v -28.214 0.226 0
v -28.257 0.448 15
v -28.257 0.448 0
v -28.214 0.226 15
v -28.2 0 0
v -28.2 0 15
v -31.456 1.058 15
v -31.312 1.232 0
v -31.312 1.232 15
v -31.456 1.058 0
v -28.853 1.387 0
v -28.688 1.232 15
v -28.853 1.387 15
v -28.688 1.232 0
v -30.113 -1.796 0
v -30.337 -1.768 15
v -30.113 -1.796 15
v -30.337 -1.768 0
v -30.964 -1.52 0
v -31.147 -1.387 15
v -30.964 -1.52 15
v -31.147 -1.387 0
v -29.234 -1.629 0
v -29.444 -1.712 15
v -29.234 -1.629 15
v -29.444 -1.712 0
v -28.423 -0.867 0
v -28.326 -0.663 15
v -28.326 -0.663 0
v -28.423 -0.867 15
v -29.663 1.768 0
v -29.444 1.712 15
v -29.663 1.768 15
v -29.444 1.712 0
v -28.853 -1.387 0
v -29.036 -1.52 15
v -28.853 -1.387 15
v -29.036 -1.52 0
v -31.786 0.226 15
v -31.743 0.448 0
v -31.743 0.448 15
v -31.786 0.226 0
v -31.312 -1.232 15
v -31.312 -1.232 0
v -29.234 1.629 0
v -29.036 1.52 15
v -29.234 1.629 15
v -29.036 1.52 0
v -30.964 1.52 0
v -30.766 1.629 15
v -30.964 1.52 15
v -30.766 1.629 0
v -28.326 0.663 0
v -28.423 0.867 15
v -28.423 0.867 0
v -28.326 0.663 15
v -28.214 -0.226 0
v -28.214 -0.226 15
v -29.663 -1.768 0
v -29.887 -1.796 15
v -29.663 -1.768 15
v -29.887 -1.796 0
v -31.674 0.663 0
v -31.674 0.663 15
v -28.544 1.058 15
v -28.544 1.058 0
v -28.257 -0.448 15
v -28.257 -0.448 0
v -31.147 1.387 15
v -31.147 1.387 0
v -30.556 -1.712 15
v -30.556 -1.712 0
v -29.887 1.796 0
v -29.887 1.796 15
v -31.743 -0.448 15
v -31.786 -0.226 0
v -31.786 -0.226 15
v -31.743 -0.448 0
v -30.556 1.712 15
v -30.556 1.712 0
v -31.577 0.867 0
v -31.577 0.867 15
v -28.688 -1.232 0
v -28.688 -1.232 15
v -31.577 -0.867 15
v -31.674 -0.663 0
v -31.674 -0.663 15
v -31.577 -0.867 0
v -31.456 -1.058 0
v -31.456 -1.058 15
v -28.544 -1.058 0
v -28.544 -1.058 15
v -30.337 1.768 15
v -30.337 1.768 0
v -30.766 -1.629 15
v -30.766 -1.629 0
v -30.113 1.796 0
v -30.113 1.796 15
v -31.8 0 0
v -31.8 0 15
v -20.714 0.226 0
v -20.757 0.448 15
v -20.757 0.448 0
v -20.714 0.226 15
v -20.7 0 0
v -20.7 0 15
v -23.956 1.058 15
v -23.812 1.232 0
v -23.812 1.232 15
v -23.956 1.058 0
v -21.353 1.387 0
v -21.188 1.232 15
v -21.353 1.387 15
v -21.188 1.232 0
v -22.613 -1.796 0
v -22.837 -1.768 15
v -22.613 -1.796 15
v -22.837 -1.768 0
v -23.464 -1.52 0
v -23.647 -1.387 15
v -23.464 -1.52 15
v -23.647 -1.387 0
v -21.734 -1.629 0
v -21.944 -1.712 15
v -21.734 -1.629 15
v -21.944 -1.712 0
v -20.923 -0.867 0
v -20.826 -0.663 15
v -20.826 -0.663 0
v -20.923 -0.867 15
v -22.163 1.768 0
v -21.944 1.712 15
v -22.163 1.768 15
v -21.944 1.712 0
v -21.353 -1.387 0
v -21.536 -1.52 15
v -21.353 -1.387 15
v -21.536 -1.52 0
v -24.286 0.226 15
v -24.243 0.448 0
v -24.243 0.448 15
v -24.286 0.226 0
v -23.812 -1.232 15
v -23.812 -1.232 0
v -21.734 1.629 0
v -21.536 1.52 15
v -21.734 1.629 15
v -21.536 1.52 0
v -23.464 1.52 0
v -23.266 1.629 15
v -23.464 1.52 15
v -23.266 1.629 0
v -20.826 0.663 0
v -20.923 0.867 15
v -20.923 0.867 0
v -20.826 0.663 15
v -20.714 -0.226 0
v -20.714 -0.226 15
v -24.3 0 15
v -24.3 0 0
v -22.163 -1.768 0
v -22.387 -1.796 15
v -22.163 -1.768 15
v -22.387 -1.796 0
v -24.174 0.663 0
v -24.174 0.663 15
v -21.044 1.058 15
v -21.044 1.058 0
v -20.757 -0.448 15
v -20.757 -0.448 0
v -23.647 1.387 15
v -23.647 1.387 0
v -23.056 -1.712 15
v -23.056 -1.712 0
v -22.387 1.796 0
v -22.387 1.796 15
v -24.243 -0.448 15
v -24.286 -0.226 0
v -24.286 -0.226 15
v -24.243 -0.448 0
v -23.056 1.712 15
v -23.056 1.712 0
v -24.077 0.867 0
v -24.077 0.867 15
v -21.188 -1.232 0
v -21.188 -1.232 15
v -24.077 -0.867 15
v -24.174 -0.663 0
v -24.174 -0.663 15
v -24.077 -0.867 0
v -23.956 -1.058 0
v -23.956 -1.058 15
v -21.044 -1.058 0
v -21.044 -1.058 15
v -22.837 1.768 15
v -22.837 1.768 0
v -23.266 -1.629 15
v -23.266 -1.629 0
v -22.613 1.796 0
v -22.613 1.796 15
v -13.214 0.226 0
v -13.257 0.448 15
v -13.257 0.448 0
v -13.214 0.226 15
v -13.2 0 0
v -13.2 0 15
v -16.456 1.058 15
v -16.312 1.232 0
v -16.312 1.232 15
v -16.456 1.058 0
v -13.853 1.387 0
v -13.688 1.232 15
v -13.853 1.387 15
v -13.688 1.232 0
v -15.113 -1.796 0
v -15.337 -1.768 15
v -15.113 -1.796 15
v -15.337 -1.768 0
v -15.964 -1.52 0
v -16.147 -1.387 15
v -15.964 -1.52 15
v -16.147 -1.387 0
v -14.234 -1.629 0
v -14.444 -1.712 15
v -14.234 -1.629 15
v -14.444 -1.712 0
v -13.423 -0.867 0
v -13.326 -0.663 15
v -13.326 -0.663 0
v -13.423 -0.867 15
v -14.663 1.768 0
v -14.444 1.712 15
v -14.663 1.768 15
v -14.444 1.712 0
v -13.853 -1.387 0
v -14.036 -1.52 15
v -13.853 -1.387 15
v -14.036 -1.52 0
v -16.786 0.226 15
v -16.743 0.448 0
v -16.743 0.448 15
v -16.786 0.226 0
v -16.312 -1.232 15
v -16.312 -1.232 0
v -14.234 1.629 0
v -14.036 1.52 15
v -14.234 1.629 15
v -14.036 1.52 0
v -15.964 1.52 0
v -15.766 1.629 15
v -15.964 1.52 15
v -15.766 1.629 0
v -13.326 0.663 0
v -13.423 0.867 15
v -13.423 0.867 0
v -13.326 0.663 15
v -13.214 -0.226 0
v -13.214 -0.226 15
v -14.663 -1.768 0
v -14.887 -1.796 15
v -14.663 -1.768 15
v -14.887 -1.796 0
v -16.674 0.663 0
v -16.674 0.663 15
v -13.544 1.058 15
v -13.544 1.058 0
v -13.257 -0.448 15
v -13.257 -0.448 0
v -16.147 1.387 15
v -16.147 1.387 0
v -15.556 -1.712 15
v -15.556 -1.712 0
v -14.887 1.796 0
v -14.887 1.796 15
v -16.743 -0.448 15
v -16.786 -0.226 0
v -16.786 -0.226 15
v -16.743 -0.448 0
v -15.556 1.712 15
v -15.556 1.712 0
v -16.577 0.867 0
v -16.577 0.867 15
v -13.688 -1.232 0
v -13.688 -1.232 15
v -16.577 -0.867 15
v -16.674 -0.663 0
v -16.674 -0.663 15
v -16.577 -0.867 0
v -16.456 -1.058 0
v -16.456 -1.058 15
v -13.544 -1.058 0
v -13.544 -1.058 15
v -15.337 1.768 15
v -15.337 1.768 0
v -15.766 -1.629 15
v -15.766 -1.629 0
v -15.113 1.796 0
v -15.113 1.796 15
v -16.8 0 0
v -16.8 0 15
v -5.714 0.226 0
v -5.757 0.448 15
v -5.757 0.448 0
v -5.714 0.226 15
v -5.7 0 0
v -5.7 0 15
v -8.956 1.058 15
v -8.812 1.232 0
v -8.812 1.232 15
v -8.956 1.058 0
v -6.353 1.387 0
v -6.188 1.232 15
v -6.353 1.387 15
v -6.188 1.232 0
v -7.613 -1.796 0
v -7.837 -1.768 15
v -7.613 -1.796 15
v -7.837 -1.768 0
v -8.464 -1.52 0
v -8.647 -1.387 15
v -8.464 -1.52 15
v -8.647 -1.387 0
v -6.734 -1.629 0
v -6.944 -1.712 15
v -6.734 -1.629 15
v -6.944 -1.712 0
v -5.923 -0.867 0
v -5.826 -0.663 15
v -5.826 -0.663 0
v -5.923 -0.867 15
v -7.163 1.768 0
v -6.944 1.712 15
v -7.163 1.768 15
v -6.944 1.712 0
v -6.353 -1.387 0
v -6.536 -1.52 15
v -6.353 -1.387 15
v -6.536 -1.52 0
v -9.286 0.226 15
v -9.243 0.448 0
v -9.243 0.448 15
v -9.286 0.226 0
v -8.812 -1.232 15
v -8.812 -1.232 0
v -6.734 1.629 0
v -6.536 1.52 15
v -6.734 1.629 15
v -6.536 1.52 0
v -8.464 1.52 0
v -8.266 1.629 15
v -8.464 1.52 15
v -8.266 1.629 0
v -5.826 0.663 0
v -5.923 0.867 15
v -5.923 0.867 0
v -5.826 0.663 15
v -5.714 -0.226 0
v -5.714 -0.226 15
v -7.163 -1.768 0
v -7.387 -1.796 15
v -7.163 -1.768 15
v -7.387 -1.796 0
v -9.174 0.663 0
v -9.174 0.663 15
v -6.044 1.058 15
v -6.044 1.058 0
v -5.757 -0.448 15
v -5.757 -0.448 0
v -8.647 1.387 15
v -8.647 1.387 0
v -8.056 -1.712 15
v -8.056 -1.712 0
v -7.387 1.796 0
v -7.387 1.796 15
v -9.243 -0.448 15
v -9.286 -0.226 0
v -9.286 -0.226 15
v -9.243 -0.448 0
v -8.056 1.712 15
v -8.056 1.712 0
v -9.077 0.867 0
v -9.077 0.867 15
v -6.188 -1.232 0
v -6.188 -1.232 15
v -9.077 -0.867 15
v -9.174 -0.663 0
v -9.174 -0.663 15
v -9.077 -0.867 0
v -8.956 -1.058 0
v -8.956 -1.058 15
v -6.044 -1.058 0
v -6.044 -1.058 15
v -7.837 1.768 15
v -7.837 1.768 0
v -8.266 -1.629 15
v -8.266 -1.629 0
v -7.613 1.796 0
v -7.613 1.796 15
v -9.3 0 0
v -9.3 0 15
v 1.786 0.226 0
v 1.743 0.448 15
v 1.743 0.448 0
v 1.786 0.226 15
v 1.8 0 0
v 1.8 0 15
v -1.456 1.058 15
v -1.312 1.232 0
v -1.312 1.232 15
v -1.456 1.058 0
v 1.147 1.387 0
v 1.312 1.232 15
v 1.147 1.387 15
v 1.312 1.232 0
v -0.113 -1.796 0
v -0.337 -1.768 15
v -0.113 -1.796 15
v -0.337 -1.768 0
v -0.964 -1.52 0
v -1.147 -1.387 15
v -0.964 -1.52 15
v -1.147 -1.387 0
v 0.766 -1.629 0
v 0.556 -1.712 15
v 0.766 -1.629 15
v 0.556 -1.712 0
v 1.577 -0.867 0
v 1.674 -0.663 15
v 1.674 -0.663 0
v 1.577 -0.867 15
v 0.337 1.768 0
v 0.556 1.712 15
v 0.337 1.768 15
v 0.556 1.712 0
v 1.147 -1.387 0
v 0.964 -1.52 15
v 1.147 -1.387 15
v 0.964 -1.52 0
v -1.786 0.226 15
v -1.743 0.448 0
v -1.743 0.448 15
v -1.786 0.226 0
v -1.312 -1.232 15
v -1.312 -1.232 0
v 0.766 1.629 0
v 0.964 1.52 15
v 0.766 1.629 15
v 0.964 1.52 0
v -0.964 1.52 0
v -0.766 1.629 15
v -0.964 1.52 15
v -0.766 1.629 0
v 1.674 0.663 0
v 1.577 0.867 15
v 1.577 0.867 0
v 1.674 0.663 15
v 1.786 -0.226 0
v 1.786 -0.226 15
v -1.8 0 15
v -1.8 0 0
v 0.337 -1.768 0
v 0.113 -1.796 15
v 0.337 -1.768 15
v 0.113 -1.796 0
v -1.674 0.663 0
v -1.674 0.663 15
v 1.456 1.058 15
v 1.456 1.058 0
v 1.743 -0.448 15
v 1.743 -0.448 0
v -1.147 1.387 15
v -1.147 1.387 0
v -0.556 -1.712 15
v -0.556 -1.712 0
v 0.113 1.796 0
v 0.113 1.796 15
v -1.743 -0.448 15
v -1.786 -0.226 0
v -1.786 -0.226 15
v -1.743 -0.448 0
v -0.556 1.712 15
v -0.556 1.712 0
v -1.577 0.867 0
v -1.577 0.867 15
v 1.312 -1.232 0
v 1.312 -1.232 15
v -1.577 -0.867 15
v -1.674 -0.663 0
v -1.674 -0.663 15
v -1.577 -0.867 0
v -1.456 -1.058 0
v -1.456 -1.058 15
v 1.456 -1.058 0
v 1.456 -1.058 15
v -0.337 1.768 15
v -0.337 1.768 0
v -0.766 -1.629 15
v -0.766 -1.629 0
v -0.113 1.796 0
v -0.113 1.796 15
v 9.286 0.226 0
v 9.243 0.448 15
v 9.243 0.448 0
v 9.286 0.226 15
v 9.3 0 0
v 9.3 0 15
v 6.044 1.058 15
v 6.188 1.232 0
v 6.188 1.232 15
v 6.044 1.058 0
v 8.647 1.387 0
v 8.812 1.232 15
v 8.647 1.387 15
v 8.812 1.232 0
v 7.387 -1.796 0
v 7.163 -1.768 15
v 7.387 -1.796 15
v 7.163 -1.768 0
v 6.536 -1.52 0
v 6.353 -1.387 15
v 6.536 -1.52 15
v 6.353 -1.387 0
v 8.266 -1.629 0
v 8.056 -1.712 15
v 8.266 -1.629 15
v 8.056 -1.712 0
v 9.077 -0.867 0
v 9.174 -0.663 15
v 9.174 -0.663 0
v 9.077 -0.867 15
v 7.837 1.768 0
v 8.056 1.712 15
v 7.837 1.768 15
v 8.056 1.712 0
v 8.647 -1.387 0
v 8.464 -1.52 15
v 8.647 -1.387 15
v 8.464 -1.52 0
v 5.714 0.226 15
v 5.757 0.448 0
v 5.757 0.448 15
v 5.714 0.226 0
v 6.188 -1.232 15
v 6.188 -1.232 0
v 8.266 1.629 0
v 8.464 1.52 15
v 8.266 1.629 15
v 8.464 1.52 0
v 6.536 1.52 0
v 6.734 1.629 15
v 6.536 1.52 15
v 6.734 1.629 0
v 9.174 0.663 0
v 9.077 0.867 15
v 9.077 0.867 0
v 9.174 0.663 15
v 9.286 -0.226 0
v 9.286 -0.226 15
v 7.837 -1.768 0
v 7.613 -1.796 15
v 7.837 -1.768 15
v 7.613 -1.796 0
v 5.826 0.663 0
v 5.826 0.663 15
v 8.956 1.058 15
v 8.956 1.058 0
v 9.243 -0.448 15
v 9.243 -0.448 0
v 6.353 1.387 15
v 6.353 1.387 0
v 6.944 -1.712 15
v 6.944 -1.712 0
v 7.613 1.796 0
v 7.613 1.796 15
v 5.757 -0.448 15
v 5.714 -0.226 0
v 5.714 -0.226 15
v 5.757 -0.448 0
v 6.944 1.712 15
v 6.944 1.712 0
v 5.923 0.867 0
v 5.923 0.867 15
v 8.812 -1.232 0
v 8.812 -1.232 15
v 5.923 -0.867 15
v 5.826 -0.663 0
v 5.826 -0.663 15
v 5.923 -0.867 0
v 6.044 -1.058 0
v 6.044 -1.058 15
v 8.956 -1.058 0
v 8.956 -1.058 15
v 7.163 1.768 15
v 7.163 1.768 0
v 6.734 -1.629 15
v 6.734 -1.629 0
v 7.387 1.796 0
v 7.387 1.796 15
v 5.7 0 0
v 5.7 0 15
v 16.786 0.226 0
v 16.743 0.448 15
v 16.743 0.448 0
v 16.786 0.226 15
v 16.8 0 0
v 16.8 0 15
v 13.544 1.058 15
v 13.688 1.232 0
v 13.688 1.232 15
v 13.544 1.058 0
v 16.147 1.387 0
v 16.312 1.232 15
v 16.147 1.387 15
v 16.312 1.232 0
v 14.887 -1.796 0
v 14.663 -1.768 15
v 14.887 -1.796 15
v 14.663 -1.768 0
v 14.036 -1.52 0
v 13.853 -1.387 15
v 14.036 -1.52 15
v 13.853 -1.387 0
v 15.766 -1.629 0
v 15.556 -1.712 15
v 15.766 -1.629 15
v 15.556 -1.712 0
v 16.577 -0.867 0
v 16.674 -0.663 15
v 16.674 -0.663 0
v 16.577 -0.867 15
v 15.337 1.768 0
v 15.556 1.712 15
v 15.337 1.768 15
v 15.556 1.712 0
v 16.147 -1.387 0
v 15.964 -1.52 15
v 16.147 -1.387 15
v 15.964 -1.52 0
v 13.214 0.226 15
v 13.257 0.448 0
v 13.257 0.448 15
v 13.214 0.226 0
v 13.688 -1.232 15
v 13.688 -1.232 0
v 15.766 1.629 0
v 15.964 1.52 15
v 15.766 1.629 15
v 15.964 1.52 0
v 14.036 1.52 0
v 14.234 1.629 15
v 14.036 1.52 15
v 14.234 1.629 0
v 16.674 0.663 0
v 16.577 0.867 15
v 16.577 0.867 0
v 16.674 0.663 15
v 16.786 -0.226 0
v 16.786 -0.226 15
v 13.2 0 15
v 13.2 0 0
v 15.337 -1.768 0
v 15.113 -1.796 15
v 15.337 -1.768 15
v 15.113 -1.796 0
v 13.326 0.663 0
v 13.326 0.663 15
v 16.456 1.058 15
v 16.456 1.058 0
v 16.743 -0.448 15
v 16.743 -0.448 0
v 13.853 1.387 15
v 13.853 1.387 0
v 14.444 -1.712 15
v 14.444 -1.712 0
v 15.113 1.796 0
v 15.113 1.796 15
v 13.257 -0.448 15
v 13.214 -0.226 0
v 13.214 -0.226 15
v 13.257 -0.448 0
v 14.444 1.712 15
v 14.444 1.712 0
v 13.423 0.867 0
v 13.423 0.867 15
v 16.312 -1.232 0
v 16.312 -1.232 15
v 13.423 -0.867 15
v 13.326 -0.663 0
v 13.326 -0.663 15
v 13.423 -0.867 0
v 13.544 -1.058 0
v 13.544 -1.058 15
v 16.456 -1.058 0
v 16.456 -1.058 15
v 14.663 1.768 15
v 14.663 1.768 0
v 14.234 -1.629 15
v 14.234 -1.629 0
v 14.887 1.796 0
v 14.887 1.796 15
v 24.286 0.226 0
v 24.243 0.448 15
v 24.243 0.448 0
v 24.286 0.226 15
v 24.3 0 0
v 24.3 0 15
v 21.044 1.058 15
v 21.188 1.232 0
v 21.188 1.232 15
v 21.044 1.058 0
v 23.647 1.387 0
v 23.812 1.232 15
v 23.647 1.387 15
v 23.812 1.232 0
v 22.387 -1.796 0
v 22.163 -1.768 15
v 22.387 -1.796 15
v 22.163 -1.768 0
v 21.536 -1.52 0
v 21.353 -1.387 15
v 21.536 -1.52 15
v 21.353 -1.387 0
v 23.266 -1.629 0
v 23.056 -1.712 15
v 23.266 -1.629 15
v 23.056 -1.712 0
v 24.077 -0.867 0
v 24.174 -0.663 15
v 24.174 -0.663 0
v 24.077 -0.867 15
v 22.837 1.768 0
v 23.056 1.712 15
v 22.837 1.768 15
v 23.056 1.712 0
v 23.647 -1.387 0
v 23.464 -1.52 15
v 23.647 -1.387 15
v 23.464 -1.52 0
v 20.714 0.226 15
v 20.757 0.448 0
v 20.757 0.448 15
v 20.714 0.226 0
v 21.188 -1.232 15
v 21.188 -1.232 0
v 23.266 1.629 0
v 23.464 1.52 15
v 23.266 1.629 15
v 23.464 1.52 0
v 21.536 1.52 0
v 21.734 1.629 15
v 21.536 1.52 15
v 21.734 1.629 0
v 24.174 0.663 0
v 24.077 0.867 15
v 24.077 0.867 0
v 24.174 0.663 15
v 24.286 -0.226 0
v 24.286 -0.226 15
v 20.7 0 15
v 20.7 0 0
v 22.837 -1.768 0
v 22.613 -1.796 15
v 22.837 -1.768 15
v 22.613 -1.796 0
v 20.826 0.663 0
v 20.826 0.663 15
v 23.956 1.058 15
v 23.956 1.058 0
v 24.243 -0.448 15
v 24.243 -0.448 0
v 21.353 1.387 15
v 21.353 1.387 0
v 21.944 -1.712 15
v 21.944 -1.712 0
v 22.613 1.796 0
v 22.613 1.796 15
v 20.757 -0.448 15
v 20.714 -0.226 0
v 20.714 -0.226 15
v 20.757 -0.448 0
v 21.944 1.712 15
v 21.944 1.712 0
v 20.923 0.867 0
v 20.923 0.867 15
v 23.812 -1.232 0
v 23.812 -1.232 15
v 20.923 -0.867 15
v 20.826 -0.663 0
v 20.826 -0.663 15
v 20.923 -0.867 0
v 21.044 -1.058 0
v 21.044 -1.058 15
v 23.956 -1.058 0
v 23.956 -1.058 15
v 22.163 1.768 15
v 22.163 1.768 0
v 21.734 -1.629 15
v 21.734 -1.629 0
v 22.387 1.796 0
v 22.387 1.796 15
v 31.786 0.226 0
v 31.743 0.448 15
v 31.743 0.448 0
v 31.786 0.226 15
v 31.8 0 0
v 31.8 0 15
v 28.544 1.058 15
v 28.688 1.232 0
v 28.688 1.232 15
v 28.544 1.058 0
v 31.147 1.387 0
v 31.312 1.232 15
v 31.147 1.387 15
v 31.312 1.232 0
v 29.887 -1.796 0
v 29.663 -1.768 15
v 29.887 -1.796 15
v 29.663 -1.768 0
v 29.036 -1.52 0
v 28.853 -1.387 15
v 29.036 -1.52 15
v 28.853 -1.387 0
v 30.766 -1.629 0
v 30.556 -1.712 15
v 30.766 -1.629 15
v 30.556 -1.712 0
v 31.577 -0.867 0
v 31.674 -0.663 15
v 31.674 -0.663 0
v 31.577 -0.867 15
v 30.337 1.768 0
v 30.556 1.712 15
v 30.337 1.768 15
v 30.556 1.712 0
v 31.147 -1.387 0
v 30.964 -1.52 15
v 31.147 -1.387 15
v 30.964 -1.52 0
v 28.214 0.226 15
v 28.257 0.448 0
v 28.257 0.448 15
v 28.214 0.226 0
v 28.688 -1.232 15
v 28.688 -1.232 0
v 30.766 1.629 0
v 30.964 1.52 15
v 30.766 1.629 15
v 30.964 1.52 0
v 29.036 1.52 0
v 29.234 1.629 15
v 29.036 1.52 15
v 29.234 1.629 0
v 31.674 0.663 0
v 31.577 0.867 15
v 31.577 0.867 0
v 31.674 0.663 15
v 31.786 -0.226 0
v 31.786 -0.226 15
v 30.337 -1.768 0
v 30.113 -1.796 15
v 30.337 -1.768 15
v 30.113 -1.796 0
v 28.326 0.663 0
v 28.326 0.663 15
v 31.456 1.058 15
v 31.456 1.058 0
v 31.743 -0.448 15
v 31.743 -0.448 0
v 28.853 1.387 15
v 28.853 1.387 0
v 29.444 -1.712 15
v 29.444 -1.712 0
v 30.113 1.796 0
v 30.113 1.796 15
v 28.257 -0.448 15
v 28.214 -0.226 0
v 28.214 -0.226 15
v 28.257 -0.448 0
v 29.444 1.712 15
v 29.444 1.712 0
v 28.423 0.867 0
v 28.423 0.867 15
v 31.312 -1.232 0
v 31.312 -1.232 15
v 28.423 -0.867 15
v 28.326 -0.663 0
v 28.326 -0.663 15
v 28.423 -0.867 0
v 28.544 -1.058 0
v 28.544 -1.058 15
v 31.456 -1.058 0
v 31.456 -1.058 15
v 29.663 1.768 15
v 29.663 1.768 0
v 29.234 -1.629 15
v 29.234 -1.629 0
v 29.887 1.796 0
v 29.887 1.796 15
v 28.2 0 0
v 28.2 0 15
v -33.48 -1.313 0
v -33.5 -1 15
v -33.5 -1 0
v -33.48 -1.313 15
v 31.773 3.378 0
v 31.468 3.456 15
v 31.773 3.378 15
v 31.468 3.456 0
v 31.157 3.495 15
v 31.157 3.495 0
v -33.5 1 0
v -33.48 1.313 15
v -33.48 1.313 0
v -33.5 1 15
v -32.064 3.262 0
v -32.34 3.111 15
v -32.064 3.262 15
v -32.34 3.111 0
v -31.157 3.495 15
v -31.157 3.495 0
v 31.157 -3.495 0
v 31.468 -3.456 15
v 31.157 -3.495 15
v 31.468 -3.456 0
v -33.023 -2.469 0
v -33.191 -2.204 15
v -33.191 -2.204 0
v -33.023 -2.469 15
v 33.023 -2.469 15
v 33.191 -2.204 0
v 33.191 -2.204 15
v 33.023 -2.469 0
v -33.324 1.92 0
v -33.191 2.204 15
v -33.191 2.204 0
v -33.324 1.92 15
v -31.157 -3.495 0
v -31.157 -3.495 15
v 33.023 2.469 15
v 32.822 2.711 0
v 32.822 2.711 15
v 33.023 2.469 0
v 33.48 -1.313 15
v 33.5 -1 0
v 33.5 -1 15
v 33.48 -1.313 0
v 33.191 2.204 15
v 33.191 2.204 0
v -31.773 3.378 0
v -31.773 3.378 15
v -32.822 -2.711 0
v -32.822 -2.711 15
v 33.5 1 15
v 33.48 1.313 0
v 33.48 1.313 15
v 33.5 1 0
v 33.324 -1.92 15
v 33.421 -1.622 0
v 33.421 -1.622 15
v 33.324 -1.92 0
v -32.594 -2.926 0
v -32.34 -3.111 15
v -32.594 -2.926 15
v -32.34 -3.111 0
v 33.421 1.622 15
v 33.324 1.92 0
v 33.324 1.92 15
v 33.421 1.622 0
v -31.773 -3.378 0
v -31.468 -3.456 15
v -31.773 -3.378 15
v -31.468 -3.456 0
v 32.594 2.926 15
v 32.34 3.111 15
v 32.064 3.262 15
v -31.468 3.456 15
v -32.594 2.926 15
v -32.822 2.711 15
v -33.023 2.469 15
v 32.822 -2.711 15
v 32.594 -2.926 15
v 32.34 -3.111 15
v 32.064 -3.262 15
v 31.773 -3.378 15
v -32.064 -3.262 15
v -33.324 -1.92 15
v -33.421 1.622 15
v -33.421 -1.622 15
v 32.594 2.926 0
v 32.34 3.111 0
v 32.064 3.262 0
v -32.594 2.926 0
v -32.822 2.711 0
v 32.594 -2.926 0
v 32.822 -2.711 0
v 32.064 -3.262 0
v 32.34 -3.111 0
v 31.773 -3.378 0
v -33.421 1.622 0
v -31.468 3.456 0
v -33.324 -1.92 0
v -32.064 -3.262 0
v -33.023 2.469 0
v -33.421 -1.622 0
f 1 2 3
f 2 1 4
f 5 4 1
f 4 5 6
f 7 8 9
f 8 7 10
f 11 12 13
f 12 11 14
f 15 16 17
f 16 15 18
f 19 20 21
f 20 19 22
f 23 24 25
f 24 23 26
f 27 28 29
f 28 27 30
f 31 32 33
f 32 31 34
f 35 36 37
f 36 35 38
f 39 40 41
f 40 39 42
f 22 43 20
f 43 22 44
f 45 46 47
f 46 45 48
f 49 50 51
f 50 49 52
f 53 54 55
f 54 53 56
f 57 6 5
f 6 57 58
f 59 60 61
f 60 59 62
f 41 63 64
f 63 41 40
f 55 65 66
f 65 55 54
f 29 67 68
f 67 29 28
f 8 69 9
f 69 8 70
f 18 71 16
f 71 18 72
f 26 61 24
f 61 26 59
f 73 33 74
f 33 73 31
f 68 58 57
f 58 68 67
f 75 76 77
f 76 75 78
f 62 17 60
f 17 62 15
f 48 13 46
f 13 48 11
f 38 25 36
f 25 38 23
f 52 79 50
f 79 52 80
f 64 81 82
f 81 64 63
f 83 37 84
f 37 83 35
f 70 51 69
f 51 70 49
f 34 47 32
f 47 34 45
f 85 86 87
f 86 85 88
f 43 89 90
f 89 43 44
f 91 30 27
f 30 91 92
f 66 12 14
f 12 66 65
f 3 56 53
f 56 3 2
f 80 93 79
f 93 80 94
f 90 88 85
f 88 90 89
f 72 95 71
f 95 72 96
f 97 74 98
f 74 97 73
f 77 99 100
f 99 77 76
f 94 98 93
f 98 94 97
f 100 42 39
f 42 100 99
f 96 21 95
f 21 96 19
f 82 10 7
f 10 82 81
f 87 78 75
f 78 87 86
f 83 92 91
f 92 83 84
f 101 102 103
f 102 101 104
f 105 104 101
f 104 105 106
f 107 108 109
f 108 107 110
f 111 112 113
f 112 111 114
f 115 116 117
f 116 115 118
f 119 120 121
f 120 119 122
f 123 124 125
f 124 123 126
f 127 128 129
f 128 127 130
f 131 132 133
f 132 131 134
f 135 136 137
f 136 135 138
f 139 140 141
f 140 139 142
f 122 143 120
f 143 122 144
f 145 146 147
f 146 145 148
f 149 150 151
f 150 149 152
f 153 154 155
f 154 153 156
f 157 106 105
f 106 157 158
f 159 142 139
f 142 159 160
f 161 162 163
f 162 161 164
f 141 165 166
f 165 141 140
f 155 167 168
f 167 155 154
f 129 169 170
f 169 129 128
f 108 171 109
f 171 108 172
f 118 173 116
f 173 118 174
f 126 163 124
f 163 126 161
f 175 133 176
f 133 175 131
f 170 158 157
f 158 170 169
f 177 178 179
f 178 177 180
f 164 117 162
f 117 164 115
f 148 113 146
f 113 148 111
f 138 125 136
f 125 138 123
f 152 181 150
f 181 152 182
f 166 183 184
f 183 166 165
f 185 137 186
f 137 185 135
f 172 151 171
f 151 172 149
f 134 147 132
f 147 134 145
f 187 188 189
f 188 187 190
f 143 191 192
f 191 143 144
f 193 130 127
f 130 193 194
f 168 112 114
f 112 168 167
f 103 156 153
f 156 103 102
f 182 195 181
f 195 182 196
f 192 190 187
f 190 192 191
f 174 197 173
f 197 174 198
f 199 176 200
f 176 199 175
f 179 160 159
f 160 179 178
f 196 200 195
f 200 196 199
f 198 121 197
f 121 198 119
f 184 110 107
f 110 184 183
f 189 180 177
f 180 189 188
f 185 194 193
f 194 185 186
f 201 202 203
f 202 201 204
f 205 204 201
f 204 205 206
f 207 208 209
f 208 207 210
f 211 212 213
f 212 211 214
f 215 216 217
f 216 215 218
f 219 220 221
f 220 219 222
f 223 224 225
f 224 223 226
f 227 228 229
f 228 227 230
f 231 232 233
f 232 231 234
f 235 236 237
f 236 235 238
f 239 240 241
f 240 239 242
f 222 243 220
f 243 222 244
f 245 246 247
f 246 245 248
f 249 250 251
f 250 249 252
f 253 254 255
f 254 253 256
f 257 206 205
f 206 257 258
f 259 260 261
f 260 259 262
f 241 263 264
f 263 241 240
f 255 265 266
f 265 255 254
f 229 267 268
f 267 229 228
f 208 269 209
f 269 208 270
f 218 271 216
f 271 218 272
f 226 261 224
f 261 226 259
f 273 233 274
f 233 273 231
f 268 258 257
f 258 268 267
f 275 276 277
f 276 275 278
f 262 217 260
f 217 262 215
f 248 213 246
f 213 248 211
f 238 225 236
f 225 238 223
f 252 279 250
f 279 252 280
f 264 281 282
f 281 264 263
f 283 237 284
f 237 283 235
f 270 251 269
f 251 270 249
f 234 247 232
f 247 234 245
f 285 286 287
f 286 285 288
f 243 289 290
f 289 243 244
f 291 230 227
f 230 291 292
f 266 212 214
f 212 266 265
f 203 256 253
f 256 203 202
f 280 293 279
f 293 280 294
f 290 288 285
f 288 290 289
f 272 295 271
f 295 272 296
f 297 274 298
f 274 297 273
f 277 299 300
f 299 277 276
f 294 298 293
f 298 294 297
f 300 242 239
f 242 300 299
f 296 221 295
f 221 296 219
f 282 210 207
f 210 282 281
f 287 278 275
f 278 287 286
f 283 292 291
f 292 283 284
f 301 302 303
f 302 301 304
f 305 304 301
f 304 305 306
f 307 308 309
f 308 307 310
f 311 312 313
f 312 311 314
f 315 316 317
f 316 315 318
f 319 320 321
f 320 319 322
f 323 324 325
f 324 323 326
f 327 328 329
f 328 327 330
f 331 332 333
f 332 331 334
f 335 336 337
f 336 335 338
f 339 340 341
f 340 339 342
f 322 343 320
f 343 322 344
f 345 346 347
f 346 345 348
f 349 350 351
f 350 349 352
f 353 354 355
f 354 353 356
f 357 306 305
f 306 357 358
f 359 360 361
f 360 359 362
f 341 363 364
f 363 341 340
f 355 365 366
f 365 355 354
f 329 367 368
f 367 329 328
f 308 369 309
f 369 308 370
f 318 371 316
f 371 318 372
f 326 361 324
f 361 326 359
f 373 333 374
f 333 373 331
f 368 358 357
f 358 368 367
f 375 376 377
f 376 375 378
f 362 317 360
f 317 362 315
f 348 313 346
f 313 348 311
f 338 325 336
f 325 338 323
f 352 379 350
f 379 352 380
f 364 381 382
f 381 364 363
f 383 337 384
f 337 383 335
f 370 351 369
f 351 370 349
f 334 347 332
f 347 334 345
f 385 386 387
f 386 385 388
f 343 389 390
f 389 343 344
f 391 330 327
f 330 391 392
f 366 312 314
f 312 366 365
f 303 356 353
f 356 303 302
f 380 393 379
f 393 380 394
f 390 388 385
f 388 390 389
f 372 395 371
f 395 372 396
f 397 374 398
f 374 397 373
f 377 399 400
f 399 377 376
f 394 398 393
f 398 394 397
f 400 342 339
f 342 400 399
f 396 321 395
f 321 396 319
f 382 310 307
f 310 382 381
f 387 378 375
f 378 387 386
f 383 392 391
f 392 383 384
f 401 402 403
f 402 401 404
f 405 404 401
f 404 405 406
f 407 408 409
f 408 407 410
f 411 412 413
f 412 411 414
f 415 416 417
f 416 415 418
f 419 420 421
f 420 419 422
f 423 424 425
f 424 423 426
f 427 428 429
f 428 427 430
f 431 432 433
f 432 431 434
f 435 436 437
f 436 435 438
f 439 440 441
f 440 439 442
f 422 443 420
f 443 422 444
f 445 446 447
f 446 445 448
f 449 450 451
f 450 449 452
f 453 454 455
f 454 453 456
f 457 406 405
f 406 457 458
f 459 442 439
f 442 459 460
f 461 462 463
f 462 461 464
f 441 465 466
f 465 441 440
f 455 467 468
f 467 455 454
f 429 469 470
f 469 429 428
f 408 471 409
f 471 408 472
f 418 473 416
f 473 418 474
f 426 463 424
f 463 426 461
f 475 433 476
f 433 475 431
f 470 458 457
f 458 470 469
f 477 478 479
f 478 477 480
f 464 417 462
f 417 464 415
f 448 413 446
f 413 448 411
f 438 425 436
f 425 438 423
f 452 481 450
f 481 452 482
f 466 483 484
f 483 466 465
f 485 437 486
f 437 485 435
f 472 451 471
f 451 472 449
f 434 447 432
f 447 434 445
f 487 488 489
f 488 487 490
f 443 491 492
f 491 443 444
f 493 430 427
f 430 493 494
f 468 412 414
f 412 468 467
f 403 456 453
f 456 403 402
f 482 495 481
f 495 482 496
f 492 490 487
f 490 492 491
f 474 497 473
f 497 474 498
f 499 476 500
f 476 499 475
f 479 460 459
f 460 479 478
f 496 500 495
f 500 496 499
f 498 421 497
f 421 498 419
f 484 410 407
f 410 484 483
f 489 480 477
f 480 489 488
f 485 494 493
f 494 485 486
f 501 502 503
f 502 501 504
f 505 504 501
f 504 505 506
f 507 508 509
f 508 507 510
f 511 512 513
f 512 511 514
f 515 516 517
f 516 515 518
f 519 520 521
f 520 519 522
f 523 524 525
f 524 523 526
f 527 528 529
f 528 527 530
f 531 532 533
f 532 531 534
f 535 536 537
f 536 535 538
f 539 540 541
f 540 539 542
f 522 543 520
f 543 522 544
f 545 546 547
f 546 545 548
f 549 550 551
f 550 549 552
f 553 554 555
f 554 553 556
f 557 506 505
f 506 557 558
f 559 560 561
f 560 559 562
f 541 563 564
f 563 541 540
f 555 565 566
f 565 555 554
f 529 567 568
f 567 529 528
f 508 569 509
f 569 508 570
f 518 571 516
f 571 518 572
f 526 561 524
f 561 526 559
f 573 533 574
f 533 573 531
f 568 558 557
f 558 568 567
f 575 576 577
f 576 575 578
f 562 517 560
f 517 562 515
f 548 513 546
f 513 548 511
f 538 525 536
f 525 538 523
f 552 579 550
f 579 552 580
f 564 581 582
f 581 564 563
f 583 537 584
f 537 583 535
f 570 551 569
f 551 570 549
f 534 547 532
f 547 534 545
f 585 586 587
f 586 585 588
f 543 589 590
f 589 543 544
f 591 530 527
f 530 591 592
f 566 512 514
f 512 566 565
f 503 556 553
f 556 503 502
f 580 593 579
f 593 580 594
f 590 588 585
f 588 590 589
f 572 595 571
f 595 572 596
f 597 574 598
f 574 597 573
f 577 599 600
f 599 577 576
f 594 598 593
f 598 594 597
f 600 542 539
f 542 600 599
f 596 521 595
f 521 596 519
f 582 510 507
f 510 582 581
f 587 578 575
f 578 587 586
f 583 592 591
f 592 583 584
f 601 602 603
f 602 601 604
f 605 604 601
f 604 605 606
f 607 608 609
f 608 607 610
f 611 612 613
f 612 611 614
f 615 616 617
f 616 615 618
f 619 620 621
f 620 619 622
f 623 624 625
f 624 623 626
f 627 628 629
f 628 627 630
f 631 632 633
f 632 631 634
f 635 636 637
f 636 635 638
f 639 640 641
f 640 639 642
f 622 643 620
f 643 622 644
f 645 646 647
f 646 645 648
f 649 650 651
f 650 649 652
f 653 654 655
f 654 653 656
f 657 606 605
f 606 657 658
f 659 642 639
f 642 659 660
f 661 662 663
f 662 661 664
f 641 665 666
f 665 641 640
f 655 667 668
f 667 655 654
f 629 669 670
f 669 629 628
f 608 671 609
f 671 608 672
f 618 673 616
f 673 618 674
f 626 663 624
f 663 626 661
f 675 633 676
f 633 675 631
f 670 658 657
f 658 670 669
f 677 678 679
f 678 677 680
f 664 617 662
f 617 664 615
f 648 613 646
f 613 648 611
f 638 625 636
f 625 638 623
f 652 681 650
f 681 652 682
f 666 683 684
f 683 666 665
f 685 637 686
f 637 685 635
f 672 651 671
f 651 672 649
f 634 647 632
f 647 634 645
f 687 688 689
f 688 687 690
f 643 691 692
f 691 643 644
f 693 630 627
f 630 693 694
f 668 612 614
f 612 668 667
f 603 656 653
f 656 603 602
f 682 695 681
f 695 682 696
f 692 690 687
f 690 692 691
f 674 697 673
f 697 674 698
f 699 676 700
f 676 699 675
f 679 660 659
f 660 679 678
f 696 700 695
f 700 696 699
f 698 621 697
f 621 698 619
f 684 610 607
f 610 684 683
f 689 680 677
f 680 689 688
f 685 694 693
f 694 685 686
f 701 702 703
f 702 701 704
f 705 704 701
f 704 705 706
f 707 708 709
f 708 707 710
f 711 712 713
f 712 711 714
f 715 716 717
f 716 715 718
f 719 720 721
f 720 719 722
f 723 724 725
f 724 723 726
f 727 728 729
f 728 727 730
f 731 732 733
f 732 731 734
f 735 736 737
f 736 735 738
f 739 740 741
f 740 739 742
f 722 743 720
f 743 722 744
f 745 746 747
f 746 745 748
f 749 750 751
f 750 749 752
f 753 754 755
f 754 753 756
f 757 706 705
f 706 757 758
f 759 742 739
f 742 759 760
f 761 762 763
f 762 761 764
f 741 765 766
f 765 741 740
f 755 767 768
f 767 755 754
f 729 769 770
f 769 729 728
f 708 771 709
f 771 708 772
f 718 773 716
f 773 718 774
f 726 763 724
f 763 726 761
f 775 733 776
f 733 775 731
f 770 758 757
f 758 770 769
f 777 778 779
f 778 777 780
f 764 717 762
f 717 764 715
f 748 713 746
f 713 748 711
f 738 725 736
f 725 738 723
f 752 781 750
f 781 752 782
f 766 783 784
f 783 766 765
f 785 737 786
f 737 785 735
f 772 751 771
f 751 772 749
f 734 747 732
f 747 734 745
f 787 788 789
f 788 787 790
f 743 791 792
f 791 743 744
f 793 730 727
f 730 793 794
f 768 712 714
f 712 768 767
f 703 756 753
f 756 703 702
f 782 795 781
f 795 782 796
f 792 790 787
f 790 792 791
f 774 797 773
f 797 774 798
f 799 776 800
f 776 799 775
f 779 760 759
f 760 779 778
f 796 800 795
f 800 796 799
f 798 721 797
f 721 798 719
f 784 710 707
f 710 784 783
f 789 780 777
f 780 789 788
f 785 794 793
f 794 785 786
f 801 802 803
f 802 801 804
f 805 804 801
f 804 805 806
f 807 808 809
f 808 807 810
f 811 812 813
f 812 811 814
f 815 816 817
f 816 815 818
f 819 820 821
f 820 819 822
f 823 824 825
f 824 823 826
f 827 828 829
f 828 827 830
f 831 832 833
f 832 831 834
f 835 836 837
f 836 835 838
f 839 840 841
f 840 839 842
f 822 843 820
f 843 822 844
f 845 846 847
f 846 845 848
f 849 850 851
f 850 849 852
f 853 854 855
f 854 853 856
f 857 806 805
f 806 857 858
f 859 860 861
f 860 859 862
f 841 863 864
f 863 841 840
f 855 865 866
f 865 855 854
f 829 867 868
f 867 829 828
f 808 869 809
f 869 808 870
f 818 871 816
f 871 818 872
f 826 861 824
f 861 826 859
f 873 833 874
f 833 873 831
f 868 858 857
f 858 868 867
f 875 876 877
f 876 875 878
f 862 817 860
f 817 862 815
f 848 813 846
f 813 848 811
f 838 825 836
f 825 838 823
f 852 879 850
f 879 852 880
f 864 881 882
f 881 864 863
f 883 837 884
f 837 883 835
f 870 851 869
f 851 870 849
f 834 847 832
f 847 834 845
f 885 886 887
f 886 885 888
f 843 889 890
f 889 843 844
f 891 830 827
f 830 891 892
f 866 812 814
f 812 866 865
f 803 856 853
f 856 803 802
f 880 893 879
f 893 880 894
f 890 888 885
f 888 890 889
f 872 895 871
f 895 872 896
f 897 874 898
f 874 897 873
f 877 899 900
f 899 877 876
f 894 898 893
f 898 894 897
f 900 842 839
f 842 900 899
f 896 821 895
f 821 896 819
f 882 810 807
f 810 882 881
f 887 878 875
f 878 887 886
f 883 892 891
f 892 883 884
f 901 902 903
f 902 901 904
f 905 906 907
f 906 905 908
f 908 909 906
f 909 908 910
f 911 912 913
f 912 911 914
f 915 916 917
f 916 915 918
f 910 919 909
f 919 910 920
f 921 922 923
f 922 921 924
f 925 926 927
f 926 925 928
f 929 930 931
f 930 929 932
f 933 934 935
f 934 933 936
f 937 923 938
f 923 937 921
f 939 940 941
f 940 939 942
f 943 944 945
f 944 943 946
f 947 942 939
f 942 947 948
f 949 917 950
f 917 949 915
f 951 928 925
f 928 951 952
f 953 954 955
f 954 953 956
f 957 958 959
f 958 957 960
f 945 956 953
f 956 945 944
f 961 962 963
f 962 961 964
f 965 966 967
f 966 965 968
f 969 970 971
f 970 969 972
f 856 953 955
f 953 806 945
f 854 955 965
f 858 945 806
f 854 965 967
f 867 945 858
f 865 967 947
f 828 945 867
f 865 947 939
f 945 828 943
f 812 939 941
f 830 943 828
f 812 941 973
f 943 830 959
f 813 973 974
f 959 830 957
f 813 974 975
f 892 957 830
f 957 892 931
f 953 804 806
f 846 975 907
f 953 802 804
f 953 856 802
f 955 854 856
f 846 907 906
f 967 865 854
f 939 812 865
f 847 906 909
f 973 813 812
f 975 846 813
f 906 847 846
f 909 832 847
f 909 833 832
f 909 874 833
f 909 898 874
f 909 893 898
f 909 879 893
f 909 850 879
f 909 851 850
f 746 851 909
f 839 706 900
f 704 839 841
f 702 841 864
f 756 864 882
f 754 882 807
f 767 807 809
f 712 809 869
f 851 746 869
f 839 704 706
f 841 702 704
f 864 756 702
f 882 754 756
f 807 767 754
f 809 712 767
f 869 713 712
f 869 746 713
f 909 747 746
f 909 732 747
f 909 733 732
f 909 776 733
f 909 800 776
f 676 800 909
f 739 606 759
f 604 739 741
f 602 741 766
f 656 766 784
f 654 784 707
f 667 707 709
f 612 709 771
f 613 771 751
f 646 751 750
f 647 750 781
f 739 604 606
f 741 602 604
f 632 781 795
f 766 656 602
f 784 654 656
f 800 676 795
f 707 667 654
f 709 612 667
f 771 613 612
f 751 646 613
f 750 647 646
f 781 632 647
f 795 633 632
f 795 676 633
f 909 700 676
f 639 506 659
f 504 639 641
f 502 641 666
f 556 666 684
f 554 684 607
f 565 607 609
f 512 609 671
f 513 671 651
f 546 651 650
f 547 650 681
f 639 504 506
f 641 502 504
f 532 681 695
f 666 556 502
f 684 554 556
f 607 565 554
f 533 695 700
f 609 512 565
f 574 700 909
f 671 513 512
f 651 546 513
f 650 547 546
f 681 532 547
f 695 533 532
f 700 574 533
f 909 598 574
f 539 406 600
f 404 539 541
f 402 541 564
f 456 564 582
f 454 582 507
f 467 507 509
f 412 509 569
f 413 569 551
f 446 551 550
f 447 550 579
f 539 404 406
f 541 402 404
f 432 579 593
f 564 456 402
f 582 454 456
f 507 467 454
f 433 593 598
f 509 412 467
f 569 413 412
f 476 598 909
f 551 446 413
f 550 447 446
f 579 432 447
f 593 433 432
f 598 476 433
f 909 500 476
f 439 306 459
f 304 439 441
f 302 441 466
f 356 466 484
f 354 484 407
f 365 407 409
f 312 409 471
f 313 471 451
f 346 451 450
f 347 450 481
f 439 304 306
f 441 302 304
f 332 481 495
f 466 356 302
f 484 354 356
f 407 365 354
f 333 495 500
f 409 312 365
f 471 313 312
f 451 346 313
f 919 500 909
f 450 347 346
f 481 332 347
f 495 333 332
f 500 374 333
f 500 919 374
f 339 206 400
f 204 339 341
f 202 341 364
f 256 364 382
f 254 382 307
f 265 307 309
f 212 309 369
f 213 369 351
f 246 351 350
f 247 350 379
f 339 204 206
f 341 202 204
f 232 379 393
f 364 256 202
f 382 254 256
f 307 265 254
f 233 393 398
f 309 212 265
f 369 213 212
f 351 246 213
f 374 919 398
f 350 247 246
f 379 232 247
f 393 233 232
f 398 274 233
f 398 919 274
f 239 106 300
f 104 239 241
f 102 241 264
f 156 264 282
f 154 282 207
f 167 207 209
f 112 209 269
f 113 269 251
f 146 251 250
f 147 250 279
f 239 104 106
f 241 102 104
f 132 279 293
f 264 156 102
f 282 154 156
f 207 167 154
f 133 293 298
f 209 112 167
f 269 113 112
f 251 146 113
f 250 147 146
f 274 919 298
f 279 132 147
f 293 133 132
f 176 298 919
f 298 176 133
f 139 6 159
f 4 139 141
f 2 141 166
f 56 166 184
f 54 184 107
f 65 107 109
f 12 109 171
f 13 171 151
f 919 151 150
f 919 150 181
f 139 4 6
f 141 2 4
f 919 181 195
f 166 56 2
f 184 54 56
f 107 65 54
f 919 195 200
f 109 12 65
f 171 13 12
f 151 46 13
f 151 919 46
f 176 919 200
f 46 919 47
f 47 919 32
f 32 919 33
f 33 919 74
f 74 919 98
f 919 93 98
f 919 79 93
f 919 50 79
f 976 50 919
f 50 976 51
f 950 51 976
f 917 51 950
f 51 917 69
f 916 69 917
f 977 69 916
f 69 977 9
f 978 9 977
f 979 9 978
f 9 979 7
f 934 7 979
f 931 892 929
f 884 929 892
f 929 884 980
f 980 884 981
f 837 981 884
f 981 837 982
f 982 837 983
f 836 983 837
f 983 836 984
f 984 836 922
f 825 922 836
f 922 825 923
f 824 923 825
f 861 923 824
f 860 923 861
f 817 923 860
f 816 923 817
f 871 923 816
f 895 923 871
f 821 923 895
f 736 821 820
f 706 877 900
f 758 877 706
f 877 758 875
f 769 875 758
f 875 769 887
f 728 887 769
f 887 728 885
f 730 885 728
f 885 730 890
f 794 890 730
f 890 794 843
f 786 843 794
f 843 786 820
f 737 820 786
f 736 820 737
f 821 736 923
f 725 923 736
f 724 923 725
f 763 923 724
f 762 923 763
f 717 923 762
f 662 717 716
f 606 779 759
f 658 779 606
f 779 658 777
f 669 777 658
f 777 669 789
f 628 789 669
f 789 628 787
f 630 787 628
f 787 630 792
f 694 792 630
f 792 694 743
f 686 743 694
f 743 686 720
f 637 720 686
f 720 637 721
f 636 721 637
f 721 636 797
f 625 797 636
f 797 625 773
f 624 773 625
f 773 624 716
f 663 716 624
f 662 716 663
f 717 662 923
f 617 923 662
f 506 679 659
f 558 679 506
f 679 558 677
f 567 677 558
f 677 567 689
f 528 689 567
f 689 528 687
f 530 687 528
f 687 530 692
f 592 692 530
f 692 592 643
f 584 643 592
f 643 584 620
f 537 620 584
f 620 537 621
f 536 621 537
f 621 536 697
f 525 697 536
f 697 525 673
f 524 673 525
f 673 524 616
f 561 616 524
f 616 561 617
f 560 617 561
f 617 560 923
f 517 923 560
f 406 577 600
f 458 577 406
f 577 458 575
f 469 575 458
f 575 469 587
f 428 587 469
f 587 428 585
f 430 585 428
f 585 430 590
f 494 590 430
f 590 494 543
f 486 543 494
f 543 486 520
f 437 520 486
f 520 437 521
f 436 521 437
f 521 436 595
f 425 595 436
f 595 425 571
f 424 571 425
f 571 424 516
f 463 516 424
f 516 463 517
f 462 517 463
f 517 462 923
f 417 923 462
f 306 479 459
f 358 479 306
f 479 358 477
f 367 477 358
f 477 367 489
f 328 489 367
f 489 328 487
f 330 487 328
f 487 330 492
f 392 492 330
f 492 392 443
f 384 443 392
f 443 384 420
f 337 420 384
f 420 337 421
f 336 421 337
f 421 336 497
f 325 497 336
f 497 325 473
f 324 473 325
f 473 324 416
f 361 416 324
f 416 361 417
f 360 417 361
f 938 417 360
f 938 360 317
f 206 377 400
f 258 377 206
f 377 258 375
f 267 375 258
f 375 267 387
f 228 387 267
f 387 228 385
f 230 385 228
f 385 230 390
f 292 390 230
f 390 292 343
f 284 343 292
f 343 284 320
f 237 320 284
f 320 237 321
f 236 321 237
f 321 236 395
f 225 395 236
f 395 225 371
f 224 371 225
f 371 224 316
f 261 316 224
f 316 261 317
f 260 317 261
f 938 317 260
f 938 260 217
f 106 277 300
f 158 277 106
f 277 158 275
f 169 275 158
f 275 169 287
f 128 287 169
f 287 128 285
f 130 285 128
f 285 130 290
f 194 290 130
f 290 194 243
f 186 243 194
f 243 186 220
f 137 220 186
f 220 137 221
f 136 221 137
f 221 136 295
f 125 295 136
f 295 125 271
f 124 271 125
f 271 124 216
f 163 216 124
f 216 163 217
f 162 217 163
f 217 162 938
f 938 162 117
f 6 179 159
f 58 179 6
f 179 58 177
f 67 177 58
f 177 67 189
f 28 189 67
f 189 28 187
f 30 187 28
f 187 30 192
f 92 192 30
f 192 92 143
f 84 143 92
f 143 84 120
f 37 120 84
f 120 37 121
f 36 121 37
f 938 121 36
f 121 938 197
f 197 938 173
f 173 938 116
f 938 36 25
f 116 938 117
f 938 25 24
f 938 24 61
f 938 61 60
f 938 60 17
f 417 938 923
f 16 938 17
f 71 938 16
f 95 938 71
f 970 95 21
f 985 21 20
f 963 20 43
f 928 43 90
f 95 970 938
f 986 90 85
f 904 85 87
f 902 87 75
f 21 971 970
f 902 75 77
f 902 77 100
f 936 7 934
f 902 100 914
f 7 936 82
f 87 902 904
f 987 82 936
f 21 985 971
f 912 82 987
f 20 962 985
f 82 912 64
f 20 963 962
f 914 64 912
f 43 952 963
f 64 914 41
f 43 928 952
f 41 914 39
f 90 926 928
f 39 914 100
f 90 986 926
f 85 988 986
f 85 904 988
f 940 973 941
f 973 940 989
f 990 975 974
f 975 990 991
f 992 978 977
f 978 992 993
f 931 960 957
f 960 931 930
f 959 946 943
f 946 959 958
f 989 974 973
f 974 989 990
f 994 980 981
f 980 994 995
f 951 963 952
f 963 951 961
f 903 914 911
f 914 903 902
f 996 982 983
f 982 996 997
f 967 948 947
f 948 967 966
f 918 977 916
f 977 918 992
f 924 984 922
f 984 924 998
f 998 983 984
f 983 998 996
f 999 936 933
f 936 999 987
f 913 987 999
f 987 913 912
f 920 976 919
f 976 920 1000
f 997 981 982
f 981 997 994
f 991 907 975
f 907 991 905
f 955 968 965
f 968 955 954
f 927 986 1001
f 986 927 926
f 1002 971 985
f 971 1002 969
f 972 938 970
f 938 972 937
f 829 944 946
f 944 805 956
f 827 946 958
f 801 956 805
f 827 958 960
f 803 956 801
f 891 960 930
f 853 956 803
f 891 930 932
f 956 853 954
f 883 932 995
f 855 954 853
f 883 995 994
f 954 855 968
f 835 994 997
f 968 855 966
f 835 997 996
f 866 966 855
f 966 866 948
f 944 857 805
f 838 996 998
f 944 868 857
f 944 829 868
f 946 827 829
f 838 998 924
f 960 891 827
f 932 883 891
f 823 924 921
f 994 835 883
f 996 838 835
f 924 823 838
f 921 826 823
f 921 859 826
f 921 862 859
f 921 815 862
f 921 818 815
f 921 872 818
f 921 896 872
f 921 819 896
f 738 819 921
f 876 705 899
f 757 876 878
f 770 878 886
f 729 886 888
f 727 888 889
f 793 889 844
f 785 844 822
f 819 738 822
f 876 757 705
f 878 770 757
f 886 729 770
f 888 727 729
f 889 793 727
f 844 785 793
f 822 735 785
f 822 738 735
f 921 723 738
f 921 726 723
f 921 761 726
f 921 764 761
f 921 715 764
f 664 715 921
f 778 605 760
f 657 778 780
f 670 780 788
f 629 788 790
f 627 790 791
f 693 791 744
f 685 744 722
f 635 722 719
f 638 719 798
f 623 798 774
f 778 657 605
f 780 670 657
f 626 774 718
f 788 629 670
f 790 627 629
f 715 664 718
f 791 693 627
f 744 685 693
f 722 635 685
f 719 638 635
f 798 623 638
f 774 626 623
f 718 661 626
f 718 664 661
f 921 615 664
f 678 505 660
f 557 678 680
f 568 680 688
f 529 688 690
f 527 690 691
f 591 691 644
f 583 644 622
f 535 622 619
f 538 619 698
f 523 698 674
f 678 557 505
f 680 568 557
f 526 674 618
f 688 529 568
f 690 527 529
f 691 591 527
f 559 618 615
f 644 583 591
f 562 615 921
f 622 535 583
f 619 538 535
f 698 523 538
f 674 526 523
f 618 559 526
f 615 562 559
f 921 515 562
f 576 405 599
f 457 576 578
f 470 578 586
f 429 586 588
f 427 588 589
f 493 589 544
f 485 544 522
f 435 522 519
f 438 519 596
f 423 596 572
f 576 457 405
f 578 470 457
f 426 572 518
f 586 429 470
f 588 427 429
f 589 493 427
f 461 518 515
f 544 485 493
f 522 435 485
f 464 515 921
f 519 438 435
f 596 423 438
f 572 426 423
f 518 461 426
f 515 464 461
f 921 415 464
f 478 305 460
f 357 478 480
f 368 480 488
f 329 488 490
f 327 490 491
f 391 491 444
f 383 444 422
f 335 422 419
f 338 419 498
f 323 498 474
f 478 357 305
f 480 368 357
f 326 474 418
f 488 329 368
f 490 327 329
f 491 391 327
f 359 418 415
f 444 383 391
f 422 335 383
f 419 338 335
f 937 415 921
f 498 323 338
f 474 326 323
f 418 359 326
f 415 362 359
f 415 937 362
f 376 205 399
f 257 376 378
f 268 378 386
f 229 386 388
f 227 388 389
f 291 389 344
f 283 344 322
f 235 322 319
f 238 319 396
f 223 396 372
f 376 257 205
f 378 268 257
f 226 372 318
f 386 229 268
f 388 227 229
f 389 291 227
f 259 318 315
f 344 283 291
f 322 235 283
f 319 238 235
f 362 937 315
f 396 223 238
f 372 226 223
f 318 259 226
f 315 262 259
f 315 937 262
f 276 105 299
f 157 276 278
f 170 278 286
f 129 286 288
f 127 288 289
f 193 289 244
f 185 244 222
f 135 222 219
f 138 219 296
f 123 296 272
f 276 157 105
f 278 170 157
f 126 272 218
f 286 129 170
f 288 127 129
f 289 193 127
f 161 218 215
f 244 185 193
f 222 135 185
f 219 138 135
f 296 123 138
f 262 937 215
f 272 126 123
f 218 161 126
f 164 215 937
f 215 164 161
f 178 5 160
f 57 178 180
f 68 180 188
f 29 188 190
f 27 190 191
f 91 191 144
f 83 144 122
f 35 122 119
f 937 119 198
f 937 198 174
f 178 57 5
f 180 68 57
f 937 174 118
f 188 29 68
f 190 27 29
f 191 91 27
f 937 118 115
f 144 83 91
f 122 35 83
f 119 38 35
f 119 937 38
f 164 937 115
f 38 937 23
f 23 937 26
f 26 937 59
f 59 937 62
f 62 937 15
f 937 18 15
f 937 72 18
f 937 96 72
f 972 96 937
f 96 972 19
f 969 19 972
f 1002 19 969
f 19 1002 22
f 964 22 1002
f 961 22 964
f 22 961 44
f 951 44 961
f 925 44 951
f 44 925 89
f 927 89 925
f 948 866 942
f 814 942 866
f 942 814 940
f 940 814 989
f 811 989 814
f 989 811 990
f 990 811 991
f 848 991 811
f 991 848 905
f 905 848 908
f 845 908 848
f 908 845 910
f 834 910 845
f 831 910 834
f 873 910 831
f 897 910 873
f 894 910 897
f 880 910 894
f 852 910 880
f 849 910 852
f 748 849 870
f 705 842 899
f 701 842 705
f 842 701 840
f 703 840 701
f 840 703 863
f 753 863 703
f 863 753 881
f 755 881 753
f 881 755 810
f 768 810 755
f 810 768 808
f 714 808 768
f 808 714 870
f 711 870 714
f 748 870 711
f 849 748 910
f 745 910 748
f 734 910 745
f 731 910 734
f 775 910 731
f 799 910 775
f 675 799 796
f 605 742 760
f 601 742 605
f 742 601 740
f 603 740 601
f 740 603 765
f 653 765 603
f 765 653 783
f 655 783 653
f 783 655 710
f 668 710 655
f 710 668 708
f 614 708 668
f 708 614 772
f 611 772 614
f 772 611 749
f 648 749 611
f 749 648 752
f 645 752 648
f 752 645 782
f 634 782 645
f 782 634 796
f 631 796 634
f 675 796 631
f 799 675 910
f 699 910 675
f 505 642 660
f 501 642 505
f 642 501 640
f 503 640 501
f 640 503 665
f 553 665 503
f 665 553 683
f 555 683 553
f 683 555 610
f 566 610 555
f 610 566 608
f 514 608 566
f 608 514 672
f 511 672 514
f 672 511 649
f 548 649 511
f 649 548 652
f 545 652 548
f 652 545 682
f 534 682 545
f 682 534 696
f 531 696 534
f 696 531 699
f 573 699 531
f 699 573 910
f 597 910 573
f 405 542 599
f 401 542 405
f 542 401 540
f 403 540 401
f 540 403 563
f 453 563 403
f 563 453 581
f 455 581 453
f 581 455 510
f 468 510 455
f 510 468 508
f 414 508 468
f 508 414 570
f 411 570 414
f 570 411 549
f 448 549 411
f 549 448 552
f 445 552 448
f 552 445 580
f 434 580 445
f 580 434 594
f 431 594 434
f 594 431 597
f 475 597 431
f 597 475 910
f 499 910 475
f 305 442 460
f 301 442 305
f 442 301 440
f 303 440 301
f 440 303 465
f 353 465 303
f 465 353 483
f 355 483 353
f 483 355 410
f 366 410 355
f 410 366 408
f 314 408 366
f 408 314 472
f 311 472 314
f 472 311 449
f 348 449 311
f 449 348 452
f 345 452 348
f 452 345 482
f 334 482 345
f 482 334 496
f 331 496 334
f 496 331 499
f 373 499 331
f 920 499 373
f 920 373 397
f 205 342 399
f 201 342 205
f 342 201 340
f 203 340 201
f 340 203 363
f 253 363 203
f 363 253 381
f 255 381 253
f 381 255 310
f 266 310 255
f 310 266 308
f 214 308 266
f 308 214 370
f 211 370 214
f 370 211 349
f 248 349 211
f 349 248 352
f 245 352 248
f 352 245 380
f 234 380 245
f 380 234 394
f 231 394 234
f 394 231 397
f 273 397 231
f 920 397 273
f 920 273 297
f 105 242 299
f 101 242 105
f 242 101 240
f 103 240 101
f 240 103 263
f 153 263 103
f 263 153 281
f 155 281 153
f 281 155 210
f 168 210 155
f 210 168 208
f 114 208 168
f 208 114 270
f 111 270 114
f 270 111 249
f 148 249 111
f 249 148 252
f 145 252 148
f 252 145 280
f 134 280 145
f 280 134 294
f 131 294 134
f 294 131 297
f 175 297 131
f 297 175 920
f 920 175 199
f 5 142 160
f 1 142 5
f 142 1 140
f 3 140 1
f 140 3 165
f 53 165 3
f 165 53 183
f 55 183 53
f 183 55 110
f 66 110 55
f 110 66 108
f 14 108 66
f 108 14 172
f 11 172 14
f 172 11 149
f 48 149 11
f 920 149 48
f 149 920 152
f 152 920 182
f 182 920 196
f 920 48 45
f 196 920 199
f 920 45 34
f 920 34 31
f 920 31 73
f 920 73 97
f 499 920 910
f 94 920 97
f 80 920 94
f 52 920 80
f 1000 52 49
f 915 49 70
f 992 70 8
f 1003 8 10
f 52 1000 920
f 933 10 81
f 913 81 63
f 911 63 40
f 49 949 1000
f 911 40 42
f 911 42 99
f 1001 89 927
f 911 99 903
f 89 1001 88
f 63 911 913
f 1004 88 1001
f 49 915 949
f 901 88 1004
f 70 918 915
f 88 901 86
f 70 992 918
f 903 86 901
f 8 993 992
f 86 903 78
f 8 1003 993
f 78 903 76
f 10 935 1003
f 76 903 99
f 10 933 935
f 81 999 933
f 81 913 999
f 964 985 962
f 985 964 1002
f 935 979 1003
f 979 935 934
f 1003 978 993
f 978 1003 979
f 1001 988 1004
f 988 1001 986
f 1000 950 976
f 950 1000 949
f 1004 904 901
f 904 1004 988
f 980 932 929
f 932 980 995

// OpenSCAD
$fn = 50;


difference() {
	union() {
		translate(v = [0, 0, 0]) {
			rotate(a = [0, 0, 0]) {
				hull() {
					translate(v = [-31.0000000000, 1.0000000000, 0]) {
						rotate(a = [0, 0, 0]) {
							translate(v = [0, 0, 0]) {
								rotate(a = [0, 0, 0]) {
									cylinder(h = 15, r = 2.5000000000);
								}
							}
						}
					}
					translate(v = [31.0000000000, 1.0000000000, 0]) {
						rotate(a = [0, 0, 0]) {
							translate(v = [0, 0, 0]) {
								rotate(a = [0, 0, 0]) {
									cylinder(h = 15, r = 2.5000000000);
								}
							}
						}
					}
					translate(v = [-31.0000000000, -1.0000000000, 0]) {
						rotate(a = [0, 0, 0]) {
							translate(v = [0, 0, 0]) {
								rotate(a = [0, 0, 0]) {
									cylinder(h = 15, r = 2.5000000000);
								}
							}
						}
					}
					translate(v = [31.0000000000, -1.0000000000, 0]) {
						rotate(a = [0, 0, 0]) {
							translate(v = [0, 0, 0]) {
								rotate(a = [0, 0, 0]) {
									cylinder(h = 15, r = 2.5000000000);
								}
							}
						}
					}
				}
			}
		}
	}
	union() {
		translate(v = [-30.0000000000, 0.0000000000, 0]) {
			rotate(a = [0, 0, 0]) {
				translate(v = [0, 0, -50]) {
					rotate(a = [0, 0, 0]) {
						cylinder(h = 100, r = 1.8000000000);
					}
				}
			}
		}
		translate(v = [-22.5000000000, 0.0000000000, 0]) {
			rotate(a = [0, 0, 0]) {
				translate(v = [0, 0, -50]) {
					rotate(a = [0, 0, 0]) {
						cylinder(h = 100, r = 1.8000000000);
					}
				}
			}
		}
		translate(v = [-15.0000000000, 0.0000000000, 0]) {
			rotate(a = [0, 0, 0]) {
				translate(v = [0, 0, -50]) {
					rotate(a = [0, 0, 0]) {
						cylinder(h = 100, r = 1.8000000000);
					}
				}
			}
		}
		translate(v = [-7.5000000000, 0.0000000000, 0]) {
			rotate(a = [0, 0, 0]) {
				translate(v = [0, 0, -50]) {
					rotate(a = [0, 0, 0]) {
						cylinder(h = 100, r = 1.8000000000);
					}
				}
			}
		}
		translate(v = [0.0000000000, 0.0000000000, 0]) {
			rotate(a = [0, 0, 0]) {
				translate(v = [0, 0, -50]) {
					rotate(a = [0, 0, 0]) {
						cylinder(h = 100, r = 1.8000000000);
					}
				}
			}
		}
		translate(v = [7.5000000000, 0.0000000000, 0]) {
			rotate(a = [0, 0, 0]) {
				translate(v = [0, 0, -50]) {
					rotate(a = [0, 0, 0]) {
						cylinder(h = 100, r = 1.8000000000);
					}
				}
			}
		}
		translate(v = [15.0000000000, 0.0000000000, 0]) {
			rotate(a = [0, 0, 0]) {
				translate(v = [0, 0, -50]) {
					rotate(a = [0, 0, 0]) {
						cylinder(h = 100, r = 1.8000000000);
					}
				}
			}
		}
		translate(v = [22.5000000000, 0.0000000000, 0]) {
			rotate(a = [0, 0, 0]) {
				translate(v = [0, 0, -50]) {
					rotate(a = [0, 0, 0]) {
						cylinder(h = 100, r = 1.8000000000);
					}
				}
			}
		}
		translate(v = [30.0000000000, 0.0000000000, 0]) {
			rotate(a = [0, 0, 0]) {
				translate(v = [0, 0, -50]) {
					rotate(a = [0, 0, 0]) {
						cylinder(h = 100, r = 1.8000000000);
					}
				}
			}
		}
	}
}
